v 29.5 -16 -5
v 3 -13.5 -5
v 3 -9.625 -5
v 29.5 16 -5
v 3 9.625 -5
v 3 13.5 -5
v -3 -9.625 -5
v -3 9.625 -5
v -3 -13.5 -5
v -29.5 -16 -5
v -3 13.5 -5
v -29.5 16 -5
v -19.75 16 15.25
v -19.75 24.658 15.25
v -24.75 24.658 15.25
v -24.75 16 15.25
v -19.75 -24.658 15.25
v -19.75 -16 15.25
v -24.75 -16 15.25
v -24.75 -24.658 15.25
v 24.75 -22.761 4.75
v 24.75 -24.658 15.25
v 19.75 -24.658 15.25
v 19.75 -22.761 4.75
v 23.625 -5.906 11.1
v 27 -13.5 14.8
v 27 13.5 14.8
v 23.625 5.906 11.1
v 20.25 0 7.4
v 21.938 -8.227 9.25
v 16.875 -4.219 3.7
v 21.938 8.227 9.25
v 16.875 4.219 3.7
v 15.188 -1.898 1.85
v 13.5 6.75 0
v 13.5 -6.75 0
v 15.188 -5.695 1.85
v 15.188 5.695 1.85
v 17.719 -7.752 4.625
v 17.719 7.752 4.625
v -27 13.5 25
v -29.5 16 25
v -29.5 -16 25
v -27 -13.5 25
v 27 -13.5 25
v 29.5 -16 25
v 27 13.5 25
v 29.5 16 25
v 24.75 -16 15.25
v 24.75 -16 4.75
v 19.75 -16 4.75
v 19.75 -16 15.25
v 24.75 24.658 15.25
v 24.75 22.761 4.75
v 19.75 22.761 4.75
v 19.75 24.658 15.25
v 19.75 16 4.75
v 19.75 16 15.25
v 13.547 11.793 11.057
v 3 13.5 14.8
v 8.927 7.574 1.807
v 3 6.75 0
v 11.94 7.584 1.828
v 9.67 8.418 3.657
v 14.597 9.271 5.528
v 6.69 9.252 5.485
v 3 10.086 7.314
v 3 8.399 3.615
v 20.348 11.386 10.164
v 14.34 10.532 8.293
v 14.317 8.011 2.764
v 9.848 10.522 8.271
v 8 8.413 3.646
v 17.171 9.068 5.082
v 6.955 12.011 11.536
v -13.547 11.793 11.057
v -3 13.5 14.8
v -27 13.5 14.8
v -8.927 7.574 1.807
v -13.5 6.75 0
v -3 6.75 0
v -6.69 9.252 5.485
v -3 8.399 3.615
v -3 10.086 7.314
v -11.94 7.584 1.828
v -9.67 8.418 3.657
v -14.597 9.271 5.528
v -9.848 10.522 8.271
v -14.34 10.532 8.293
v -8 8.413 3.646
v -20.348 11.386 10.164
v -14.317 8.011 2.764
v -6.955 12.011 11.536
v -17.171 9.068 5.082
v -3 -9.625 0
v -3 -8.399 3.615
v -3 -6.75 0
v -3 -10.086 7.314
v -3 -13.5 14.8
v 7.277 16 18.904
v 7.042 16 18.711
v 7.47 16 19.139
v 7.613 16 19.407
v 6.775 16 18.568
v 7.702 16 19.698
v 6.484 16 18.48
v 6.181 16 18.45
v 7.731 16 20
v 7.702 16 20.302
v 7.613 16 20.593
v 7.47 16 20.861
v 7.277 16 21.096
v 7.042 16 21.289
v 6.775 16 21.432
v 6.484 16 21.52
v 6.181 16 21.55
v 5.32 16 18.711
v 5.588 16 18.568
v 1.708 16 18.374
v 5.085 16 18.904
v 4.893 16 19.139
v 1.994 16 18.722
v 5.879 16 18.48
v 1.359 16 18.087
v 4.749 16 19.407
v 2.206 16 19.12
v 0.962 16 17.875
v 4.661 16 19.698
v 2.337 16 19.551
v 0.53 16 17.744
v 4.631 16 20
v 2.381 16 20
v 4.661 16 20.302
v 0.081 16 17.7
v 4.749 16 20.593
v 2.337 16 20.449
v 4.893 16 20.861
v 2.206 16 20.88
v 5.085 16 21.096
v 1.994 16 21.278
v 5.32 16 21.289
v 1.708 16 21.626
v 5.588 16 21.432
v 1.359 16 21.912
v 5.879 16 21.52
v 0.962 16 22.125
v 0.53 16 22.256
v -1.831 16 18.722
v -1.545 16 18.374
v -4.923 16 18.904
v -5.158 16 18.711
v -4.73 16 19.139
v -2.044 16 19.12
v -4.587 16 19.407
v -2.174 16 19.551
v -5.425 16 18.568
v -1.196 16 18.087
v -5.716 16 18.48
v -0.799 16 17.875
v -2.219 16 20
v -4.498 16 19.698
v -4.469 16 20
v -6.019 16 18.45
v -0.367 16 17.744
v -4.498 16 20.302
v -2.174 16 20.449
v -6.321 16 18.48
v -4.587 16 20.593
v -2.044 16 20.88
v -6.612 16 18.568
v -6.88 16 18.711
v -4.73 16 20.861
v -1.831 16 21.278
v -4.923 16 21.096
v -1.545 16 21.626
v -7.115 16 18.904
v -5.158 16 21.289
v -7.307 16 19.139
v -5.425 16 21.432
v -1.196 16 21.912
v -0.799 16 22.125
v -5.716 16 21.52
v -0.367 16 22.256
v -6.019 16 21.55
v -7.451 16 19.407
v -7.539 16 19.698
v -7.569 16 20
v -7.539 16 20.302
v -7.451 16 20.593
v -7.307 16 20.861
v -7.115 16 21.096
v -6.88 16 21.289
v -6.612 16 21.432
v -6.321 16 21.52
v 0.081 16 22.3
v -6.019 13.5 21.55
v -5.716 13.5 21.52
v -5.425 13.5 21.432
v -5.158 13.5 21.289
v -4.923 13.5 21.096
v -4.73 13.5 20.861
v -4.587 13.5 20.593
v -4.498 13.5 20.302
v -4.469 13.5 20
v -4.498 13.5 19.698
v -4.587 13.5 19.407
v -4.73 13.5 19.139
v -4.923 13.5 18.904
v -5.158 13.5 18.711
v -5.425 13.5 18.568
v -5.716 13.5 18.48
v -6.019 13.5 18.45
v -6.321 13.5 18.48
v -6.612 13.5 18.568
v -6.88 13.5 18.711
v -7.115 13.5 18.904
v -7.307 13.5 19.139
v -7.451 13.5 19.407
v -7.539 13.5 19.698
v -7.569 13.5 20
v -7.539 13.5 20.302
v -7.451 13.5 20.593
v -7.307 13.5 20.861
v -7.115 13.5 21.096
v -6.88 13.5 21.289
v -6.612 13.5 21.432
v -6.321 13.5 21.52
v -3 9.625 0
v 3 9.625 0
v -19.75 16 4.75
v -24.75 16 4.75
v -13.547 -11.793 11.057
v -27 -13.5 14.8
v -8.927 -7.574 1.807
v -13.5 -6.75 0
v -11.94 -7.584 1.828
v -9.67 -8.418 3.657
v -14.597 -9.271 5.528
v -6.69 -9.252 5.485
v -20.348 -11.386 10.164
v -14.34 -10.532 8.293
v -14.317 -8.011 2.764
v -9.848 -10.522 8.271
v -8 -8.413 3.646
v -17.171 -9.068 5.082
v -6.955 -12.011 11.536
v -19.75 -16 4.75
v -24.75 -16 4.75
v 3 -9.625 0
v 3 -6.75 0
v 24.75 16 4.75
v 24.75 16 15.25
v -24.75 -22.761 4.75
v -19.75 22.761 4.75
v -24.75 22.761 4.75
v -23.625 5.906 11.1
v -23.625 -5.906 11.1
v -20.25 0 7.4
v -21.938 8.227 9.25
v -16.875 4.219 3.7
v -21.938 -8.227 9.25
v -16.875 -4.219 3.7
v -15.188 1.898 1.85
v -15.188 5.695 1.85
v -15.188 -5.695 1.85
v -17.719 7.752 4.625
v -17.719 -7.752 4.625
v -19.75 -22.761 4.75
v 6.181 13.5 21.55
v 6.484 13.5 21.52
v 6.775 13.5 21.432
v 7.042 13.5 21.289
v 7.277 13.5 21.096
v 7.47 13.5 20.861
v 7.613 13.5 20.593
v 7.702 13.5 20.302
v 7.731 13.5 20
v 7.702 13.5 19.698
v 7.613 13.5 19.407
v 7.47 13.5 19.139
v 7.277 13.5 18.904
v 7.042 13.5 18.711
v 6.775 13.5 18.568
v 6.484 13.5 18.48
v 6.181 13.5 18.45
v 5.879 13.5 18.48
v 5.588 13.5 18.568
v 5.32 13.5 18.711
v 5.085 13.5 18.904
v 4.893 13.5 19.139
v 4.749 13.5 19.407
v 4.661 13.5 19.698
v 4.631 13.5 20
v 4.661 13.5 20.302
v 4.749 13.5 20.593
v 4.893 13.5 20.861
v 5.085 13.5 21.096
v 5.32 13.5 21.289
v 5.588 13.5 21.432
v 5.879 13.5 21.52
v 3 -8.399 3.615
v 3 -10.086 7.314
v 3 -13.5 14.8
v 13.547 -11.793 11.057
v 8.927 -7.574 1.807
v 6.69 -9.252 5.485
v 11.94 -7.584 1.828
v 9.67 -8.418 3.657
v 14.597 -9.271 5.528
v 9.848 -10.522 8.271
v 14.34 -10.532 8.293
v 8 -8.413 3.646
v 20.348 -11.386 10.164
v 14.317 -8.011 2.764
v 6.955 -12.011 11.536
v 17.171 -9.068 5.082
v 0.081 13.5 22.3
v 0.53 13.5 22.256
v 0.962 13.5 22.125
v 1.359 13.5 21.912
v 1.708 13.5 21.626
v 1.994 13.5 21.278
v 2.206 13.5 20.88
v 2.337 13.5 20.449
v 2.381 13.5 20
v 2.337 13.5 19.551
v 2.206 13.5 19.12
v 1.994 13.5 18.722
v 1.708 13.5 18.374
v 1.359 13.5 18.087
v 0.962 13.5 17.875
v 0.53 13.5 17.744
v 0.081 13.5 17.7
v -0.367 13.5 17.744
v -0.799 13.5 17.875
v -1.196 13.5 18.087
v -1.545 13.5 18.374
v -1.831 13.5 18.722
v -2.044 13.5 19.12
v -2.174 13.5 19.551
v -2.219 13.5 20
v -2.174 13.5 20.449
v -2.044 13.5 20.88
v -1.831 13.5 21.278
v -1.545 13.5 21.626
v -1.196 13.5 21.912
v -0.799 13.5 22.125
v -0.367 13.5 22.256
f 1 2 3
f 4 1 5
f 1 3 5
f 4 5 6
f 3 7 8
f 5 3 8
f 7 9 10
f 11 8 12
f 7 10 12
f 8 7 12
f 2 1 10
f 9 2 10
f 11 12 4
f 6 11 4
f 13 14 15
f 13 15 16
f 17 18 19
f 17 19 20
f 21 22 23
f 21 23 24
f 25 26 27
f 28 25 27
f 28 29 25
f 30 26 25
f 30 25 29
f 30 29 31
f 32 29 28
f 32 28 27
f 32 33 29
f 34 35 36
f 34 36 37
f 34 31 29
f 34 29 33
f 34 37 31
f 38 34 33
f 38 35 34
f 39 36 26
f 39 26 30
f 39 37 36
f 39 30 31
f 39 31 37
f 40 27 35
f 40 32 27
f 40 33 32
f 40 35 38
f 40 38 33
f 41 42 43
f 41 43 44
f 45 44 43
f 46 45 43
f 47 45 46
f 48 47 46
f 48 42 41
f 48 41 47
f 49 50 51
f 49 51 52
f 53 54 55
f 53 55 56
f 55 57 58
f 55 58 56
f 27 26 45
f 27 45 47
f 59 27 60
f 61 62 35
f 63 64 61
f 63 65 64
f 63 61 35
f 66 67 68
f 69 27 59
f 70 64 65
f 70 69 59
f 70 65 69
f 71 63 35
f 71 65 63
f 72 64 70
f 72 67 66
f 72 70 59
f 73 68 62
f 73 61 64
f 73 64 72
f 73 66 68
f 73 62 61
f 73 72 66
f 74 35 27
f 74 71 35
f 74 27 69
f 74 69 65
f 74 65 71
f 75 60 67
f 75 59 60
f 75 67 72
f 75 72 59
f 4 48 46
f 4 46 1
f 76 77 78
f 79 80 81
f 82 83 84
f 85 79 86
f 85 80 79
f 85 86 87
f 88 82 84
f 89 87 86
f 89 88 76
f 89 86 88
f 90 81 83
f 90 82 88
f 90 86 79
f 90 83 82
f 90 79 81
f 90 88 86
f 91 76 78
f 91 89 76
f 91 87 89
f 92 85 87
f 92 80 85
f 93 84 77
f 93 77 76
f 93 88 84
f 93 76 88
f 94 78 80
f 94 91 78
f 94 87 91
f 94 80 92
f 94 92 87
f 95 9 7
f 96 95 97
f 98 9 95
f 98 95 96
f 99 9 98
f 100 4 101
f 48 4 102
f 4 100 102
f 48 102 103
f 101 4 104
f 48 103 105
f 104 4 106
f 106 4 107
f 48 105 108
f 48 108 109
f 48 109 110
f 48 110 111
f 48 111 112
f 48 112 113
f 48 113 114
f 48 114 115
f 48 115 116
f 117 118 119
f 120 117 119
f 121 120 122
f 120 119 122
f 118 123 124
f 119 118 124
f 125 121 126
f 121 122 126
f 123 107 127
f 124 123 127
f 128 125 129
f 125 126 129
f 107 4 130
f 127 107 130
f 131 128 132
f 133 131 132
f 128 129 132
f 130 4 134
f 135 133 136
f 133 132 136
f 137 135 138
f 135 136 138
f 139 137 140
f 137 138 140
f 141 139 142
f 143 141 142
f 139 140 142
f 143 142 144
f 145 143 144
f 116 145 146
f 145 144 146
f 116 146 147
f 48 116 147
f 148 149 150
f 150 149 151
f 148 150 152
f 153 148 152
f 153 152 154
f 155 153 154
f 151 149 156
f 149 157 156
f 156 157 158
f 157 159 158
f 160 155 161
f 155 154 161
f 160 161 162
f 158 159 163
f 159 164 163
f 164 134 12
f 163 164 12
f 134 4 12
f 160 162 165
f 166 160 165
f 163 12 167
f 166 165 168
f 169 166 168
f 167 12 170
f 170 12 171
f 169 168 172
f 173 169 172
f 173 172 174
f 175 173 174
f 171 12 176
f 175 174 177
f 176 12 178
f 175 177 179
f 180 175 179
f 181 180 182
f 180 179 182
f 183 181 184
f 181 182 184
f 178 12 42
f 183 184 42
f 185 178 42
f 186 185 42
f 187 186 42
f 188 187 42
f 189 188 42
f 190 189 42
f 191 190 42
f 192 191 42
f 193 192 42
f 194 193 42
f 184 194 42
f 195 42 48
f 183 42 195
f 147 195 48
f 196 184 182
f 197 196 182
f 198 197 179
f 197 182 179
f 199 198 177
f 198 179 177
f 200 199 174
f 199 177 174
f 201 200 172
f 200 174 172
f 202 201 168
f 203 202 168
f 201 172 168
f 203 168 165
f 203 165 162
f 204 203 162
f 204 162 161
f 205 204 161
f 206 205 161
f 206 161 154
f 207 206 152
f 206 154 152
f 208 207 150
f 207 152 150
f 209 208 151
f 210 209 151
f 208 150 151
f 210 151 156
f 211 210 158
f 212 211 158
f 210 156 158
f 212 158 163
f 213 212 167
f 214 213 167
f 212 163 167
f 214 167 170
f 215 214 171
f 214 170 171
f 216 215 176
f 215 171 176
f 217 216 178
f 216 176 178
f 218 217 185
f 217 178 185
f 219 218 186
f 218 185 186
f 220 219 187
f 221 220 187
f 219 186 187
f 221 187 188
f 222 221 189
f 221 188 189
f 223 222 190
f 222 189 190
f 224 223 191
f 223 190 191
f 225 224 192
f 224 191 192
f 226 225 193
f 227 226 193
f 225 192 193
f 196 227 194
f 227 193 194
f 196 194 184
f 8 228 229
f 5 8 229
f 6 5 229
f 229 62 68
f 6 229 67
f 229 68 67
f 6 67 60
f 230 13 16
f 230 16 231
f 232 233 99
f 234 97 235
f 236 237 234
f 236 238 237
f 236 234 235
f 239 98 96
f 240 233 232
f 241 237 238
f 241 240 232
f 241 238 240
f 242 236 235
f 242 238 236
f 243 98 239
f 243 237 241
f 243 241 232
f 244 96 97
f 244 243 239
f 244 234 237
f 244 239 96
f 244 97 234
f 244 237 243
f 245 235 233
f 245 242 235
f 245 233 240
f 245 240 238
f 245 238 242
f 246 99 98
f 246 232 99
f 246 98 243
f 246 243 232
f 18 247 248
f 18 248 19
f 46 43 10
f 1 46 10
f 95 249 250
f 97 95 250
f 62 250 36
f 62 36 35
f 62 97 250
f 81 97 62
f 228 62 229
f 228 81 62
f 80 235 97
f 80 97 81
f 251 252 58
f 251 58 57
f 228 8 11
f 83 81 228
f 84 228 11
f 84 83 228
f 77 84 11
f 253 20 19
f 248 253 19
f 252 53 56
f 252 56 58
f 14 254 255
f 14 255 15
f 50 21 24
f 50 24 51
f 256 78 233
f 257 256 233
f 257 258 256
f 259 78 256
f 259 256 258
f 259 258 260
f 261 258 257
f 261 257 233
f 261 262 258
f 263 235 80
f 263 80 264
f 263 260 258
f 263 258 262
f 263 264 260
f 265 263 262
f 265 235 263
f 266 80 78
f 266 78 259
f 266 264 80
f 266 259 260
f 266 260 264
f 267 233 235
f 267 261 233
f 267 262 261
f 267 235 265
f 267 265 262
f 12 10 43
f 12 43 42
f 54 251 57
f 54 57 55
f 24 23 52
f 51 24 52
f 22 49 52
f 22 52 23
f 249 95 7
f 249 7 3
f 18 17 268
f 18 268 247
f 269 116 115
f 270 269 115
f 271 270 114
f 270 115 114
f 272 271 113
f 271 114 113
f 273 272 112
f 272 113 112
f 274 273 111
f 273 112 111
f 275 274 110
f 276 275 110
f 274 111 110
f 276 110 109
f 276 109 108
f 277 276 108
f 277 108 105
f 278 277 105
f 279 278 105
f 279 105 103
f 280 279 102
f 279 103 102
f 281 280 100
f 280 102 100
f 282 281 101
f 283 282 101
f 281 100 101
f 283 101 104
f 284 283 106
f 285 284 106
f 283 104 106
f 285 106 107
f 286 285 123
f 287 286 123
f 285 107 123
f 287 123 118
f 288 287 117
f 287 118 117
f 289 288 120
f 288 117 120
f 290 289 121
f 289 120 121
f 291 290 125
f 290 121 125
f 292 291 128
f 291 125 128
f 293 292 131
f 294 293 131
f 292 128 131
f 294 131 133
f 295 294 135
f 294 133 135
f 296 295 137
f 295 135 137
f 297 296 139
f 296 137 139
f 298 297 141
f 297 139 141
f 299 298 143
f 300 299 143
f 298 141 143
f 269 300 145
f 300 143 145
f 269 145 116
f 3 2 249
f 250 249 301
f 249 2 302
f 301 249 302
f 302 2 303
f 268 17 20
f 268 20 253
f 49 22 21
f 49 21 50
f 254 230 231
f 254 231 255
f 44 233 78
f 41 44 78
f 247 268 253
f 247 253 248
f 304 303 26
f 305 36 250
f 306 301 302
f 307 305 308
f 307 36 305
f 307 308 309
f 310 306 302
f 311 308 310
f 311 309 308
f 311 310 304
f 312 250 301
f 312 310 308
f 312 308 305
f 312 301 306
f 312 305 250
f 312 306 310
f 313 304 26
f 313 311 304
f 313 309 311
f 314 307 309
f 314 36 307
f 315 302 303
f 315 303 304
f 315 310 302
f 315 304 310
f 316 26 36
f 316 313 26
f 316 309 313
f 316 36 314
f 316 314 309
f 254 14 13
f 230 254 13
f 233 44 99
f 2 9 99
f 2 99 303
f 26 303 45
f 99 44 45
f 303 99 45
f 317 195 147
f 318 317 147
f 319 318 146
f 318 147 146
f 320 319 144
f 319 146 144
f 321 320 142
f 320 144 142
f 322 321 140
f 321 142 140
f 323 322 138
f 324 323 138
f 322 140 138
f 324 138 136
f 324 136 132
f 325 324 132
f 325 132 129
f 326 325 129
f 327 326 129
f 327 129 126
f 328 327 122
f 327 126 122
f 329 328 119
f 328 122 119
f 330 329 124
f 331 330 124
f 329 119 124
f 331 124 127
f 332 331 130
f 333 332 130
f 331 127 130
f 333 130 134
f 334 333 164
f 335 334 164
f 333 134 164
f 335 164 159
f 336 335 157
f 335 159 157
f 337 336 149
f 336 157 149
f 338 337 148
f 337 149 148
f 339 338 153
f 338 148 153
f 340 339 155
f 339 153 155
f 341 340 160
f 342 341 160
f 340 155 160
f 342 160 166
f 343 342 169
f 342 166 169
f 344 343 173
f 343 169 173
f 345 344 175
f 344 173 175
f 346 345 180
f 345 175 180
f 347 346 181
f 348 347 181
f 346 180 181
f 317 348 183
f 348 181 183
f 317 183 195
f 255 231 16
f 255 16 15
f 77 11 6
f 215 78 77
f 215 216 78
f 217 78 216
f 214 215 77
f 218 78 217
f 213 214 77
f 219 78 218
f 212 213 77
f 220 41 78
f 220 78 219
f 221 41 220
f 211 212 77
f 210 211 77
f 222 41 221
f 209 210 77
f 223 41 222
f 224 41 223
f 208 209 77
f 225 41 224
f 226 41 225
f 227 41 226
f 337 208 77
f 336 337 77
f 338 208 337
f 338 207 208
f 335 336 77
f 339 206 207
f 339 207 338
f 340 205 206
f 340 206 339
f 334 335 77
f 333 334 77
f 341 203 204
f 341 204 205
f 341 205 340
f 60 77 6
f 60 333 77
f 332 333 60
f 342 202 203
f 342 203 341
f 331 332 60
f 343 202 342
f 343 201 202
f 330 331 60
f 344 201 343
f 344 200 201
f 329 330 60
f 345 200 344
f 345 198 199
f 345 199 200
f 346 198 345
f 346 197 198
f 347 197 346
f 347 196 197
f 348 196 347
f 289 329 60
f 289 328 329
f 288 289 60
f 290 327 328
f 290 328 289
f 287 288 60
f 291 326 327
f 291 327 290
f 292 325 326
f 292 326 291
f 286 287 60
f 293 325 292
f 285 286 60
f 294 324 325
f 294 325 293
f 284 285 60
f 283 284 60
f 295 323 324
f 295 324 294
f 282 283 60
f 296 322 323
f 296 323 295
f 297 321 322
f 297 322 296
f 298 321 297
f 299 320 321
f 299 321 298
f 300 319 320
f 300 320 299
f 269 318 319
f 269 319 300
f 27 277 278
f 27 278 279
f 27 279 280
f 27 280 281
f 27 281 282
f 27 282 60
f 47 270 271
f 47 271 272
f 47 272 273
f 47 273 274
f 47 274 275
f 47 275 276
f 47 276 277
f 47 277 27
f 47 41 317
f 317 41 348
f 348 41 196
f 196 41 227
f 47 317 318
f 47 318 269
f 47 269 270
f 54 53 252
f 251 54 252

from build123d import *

# Parameters (mm, degrees)
CROQUIS1_W                   = 54
CROQUIS1_H                   = 27
SALIENTE_EXTRUIR1_DEPTH      = 14.8
CROQUIS8_W                   = 6
CROQUIS8_H                   = 27
CORTAR_EXTRUIR2_DEPTH        = 14.8
SALIENTE_EXTRUIR2_DEPTH      = 35
SALIENTE_EXTRUIR2_DEPTH_BACK = 35
CROQUIS12_W                  = 2.5
CROQUIS12_H                  = 27
SALIENTE_EXTRUIR3_DEPTH      = 25
CROQUIS19_W                  = 5.5
CROQUIS19_H                  = 30
CORTAR_EXTRUIR15_DEPTH       = 54.609700615
CROQUIS18_R                  = 2.3
CROQUIS18_R_2                = 1.55
CORTAR_EXTRUIR12_DEPTH       = 2.5
CROQUIS20_W                  = 6
CROQUIS20_H                  = 3.875
CORTAR_EXTRUIR16_DEPTH       = 42.847939017
SALIENTE_EXTRUIR4_DEPTH      = 59
SALIENTE_EXTRUIR4_2_DEPTH    = 59
CROQUIS23_W                  = 4.75
CROQUIS23_H                  = 4.32915245
CROQUIS23_W_2                = 39.5
CROQUIS23_H_2                = 8.6583049
CORTAR_EXTRUIR17_DEPTH       = 44.455086061


with BuildPart() as part:
    # Croquis1 → Saliente-Extruir1 (new body)
    with BuildSketch(Plane.XY):
        Rectangle(CROQUIS1_W, CROQUIS1_H)
    extrude(amount=SALIENTE_EXTRUIR1_DEPTH)

    # Croquis5 → Cortar-Recubrir3 section 0
    with BuildSketch(Plane.XY.offset(14.8)):
        with BuildLine():
            Line((-27, 13.5), (-27, -13.5))
            Line((-27, -13.5), (27, -13.5))
            Line((27, -13.5), (27, 13.5))
            Line((27, 13.5), (-27, 13.5))
        make_face()
    # Croquis6 → Cortar-Recubrir3 section 1
    with BuildSketch(Plane(origin=(0, 0, 0), x_dir=(-1, 0, 0), z_dir=(0, 0, -1))):
        with BuildLine():
            Line((-13.5, -6.75), (13.5, -6.75))
            Line((13.5, -6.75), (13.5, 6.75))
            Line((13.5, 6.75), (-13.5, 6.75))
            Line((-13.5, 6.75), (-13.5, -6.75))
        make_face()
    loft(mode=Mode.SUBTRACT)

    # Croquis8 → Cortar-Extruir2 (cut)
    with BuildSketch(Plane(origin=(0, 0, 0), x_dir=(-1, 0, 0), z_dir=(0, 0, -1))):
        Rectangle(CROQUIS8_W, CROQUIS8_H)
    extrude(amount=-CORTAR_EXTRUIR2_DEPTH, mode=Mode.SUBTRACT)


with BuildPart() as cortar_extruir2_piece_1:
    # of the separate pieces the step leaves, piece 1, a body of its own (cortar_extruir2_pieces)
    add(part.part.solids().sort_by_distance((3, -13.5, 0))[0])



with BuildPart() as cortar_extruir2_piece_2:
    # of the separate pieces the step leaves, piece 2, a body of its own (cortar_extruir2_pieces)
    add(part.part.solids().sort_by_distance((-27, -13.5, 0))[0])


with BuildPart() as cortar_extruir2_piece_1_1:
    add(cortar_extruir2_piece_1.part)

    add(cortar_extruir2_piece_2.part)  # Saliente-Extruir2 merges Cortar-Extruir2 piece 2
    # Croquis10 → Saliente-Extruir2 (add, two sides: drawn at the far end of the back side and taken through both)
    with BuildSketch(Plane(origin=(0, 0, 0), x_dir=(0, 0, -1), z_dir=(1, 0, 0)).offset(-SALIENTE_EXTRUIR2_DEPTH_BACK)):
        Polygon((-14.8, 13.5), (-25, 13.5), (-25, 15.75), (-25, 16), (-24.680771502, 16), (5, 16), (5, 15), (5, -16), (-24.680771502, -16), (-25, -16), (-25, -15.75), (-25, -13.5), (-14.8, -13.5), (0, -13.5), (0, 13.5), align=None)
    extrude(amount=SALIENTE_EXTRUIR2_DEPTH + SALIENTE_EXTRUIR2_DEPTH_BACK)

    # Croquis12 → Saliente-Extruir3 (add)
    with BuildSketch(Plane.XY):
        with Locations((-28.25, 0)):
            Rectangle(CROQUIS12_W, CROQUIS12_H)
        with Locations((28.25, 0)):
            Rectangle(CROQUIS12_W, CROQUIS12_H)
    extrude(amount=SALIENTE_EXTRUIR3_DEPTH)

    # Croquis19 → Cortar-Extruir15 (cut, through all)
    with BuildSketch(Plane(origin=(0, 16, 0), x_dir=(1, 0, 0), z_dir=(0, 1, 0))):
        with Locations((-32.25, -10)):
            Rectangle(CROQUIS19_W, CROQUIS19_H)
        with Locations((32.25, -10)):
            Rectangle(CROQUIS19_W, CROQUIS19_H)
    extrude(amount=-CORTAR_EXTRUIR15_DEPTH, mode=Mode.SUBTRACT)

    # Croquis18 → Cortar-Extruir12 (cut)
    with BuildSketch(Plane(origin=(0, 16, 0), x_dir=(1, 0, 0), z_dir=(0, 1, 0))):
        with Locations(Location((0.081355667, -19.999867625, 0), (0, 0, 270))):
            Circle(CROQUIS18_R)
        with Locations(Location((6.181355666, -20, 0), (0, 0, 270))):
            Circle(CROQUIS18_R_2)
        with Locations(Location((-6.018644331, -20, 0), (0, 0, 270))):
            Circle(CROQUIS18_R_2)
    extrude(amount=-CORTAR_EXTRUIR12_DEPTH, mode=Mode.SUBTRACT)

    # Croquis20 → Cortar-Extruir16 (cut, through all)
    with BuildSketch(Plane.XY):
        with Locations((0, 11.5625)):
            Rectangle(CROQUIS20_W, CROQUIS20_H)
        with Locations((0, -11.5625)):
            Rectangle(CROQUIS20_W, CROQUIS20_H)
    extrude(amount=-CORTAR_EXTRUIR16_DEPTH, mode=Mode.SUBTRACT)


with BuildPart() as body_2:
    # Croquis22 → Saliente-Extruir4 (new body)
    with BuildSketch(Plane(origin=(29.5, 0, 0), x_dir=(0, 0, -1), z_dir=(1, 0, 0))):
        Polygon((-15.25, 16), (-4.75, 16), (-4.75, 22.761406063), (-15.25, 24.6583049), align=None)
    extrude(amount=-SALIENTE_EXTRUIR4_DEPTH)


with BuildPart() as body_3:
    # Croquis22 → Saliente-Extruir4 2 (new body)
    with BuildSketch(Plane(origin=(29.5, 0, 0), x_dir=(0, 0, -1), z_dir=(1, 0, 0))):
        Polygon((-15.25, -16), (-15.25, -24.6583049), (-4.75, -22.761406063), (-4.75, -16), align=None)
    extrude(amount=-SALIENTE_EXTRUIR4_2_DEPTH)


with BuildPart() as cortar_extruir17_tool:
    # Croquis23 → Cortar-Extruir17 (new, through all)
    with BuildSketch(Plane.XY.offset(15.25)):
        with Locations((-27.125, 22.493728675)):
            Rectangle(CROQUIS23_W, CROQUIS23_H)
        with Locations((-27.125, 18.164576225)):
            Rectangle(CROQUIS23_W, CROQUIS23_H)
        with Locations((0, 18.164576225)):
            Rectangle(CROQUIS23_W_2, CROQUIS23_H)
        with Locations((0, 22.493728675)):
            Rectangle(CROQUIS23_W_2, CROQUIS23_H)
        with Locations((27.125, 22.493728675)):
            Rectangle(CROQUIS23_W, CROQUIS23_H)
        with Locations((27.125, 18.164576225)):
            Rectangle(CROQUIS23_W, CROQUIS23_H)
        with Locations((0, -20.32915245)):
            Rectangle(CROQUIS23_W_2, CROQUIS23_H_2)
        with Locations((27.125, -20.32915245)):
            Rectangle(CROQUIS23_W, CROQUIS23_H_2)
        with Locations((-27.125, -20.32915245)):
            Rectangle(CROQUIS23_W, CROQUIS23_H_2)
    extrude(amount=-CORTAR_EXTRUIR17_DEPTH)


with BuildPart() as body_2_1:
    add(body_2.part)

    # Cortar-Extruir17: cut by cortar_extruir17_tool
    add(cortar_extruir17_tool.part, mode=Mode.SUBTRACT)


with BuildPart() as body_3_1:
    add(body_3.part)

    # Cortar-Extruir17: cut by cortar_extruir17_tool
    add(cortar_extruir17_tool.part, mode=Mode.SUBTRACT)


with BuildPart() as cortar_extruir17_piece_1:
    # of the separate pieces the step leaves, piece 1, a body of its own (cortar_extruir17_pieces)
    add(body_2_1.part.solids().sort_by_distance((24.75, 22.761406063, 4.75))[0])


with BuildPart() as cortar_extruir17_piece_2:
    # of the separate pieces the step leaves, piece 2, a body of its own (cortar_extruir17_pieces)
    add(body_2_1.part.solids().sort_by_distance((-19.75, 22.761406063, 4.75))[0])


with BuildPart() as cortar_extruir17_piece_1_of_body_3:
    # of the separate pieces the step leaves, piece 1, a body of its own (cortar_extruir17_pieces_of_body_3)
    add(body_3_1.part.solids().sort_by_distance((-19.75, -24.6583049, 15.25))[0])


with BuildPart() as cortar_extruir17_piece_2_of_body_3:
    # of the separate pieces the step leaves, piece 2, a body of its own (cortar_extruir17_pieces_of_body_3)
    add(body_3_1.part.solids().sort_by_distance((24.75, -24.6583049, 15.25))[0])


solid = Compound([cortar_extruir2_piece_1_1.part, cortar_extruir17_piece_1.part, cortar_extruir17_piece_2.part, cortar_extruir17_piece_1_of_body_3.part, cortar_extruir17_piece_2_of_body_3.part])
